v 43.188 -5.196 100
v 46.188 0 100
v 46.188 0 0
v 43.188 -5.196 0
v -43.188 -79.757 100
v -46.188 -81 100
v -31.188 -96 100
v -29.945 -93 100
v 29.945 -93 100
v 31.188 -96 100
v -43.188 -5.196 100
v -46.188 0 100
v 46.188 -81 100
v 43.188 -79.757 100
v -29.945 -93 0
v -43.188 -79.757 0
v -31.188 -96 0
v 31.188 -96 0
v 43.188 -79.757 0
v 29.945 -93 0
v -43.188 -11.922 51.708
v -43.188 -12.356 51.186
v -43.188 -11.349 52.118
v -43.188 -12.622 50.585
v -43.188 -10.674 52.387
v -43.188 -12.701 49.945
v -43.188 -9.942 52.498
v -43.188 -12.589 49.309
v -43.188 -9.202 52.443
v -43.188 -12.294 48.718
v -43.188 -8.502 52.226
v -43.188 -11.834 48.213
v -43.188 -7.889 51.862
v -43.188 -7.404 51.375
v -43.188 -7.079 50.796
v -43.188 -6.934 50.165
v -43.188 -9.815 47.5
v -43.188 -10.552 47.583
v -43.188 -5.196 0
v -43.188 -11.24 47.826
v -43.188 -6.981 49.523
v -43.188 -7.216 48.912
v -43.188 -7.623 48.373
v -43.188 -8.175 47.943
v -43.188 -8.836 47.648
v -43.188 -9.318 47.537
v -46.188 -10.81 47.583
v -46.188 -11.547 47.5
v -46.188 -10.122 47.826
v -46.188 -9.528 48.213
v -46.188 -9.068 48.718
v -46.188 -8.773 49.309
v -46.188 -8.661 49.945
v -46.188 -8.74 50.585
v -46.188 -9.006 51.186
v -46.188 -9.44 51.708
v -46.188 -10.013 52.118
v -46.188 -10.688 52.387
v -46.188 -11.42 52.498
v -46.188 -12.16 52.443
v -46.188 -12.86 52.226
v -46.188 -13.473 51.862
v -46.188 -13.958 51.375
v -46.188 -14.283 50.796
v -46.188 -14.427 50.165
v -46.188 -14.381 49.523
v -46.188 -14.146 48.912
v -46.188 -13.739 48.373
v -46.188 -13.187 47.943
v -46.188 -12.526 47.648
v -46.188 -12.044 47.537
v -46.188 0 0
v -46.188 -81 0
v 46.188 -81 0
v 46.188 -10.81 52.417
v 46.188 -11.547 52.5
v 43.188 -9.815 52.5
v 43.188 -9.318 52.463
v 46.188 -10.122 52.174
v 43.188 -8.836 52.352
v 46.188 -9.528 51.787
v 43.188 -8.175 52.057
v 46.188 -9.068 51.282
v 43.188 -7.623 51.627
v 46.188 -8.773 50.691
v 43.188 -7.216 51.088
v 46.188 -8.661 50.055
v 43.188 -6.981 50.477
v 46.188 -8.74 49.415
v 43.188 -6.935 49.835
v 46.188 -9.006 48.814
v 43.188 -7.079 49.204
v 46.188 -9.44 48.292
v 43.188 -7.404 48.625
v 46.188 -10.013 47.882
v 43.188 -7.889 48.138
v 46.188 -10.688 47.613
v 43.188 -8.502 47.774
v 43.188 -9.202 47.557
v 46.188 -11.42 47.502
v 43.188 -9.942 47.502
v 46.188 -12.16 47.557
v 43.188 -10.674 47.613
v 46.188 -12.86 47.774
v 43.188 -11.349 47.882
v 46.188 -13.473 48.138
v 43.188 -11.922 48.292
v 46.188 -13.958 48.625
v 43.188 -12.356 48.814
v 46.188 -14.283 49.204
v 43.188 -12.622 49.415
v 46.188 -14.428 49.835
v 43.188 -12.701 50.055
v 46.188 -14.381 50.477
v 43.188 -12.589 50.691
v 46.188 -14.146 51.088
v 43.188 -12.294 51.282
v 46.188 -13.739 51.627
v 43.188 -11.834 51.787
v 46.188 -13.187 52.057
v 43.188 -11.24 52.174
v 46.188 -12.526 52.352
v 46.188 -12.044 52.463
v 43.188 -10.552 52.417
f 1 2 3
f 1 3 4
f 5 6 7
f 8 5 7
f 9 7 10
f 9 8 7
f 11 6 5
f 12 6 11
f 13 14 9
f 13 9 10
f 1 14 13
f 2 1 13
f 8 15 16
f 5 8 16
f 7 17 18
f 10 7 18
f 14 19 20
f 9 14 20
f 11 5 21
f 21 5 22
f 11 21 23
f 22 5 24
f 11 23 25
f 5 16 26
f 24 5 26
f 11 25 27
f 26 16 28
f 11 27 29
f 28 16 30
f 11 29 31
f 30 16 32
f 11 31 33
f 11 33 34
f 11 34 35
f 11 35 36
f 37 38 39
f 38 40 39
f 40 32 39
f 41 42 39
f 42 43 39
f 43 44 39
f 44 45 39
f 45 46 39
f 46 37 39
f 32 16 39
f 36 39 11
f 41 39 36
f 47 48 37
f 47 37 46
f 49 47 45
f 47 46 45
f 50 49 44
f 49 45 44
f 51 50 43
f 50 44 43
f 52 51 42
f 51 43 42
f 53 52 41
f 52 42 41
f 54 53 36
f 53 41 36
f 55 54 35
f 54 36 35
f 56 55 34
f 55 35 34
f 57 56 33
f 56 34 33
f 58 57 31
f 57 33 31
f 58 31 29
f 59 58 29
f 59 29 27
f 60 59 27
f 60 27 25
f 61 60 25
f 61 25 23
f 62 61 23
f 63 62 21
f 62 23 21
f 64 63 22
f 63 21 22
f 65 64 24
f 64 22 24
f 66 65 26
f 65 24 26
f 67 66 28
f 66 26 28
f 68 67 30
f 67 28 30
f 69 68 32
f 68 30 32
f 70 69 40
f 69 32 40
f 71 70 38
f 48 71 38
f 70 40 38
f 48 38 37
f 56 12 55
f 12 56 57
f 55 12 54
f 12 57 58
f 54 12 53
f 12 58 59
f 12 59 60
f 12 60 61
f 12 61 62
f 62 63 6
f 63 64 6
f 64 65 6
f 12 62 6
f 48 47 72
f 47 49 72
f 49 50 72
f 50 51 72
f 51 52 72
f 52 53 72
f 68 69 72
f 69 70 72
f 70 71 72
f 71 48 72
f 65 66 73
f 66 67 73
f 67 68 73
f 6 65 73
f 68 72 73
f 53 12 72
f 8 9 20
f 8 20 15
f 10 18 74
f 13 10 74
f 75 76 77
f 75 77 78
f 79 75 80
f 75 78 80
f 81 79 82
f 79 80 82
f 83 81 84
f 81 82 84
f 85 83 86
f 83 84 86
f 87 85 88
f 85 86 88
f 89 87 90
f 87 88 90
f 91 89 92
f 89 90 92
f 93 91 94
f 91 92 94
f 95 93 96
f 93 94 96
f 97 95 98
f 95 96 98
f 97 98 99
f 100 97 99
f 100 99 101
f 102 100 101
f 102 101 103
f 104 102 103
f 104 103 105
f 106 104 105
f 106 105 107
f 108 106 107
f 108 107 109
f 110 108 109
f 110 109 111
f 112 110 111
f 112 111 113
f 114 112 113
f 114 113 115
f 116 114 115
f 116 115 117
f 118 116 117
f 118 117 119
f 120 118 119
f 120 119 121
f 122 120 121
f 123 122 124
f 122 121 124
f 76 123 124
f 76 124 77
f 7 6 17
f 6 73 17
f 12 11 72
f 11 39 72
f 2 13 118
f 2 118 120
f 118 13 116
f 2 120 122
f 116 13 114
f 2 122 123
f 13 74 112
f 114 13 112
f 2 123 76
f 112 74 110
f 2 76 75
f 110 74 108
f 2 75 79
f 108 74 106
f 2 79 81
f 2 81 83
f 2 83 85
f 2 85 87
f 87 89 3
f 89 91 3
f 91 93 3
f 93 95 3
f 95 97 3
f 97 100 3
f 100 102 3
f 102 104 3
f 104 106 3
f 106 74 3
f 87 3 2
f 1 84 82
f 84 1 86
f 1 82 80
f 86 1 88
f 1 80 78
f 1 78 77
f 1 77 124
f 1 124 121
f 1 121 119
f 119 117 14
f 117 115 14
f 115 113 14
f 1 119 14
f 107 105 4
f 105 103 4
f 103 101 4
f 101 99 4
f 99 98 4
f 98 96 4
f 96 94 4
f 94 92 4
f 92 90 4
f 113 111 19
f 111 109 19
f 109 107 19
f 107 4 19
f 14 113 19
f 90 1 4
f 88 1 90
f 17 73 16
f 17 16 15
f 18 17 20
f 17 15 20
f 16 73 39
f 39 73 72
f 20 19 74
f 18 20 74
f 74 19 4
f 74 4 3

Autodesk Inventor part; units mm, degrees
ref_plane "YZ Plane" through (0, 0, 0) normal (1, 0, 0) x (0, 1, 0)
ref_plane "XZ Plane" through (0, 0, 0) normal (0, 1, 0) x (-1, 0, 0)
ref_plane "XY Plane" through (0, 0, 0) normal (0, 0, 1) x (1, 0, 0)
sketch "Sketch1" plane through (0, 0, 0) normal (0, 0, 1) x (1, 0, 0)
  line L0 (-46.188, 0) -> (-23.094, 40)
  line L1 (-23.094, 40) -> (23.094, 40)
  line L2 (23.094, 40) -> (46.188, 0)
  line L3 (46.188, 0) -> (23.094, -40)
  line L4 (23.094, -40) -> (-23.094, -40)
  line L5 (-23.094, -40) -> (-46.188, 0)
  line L6 (-48.188, 0) -> (-46.188, 0)
  line L7 (46.188, 0) -> (48.188, 0)
  line L8 (-46.188, 0) -> (-43.188, -5.1962)
  line L9 (46.188, 0) -> (43.188, -5.1962)
  line L10 (-46.188, 0) -> (-46.188, -81)
  line L11 (-46.188, -81) -> (-31.188, -96)
  line L12 (-31.188, -96) -> (31.188, -96)
  line L13 (31.188, -96) -> (46.188, -81)
  line L14 (46.188, -81) -> (46.188, 0)
  line L15 (43.188, -5.1962) -> (43.188, -79.7574)
  line L16 (43.188, -79.7574) -> (29.9454, -93)
  line L17 (29.9454, -93) -> (-29.9454, -93)
  line L18 (-29.9454, -93) -> (-43.188, -79.7574)
  line L19 (-43.188, -79.7574) -> (-43.188, -5.1962)
  point P0 (0, 0)
  point P1 (0, 0)
  point P2 (0, -96)
  dimension "d0" = 80
  dimension "d6" = 56
  dimension "d7" = 15
  dimension "d8" = 15
  dimension "d9" = 3
extrude "Extrusion1" add sketch "Sketch1" along normal blind 100 contours L5 L19 L18 L17 L16 L15 L3 L14 L13 L12 L11 L10
sketch "Sketch2" plane through (-46.188, 0, 100) normal (0.866, 0.5, 0) x (0, 0, -1)
  circle A0 centre (50, -10) radius 2.5
  line L0 (100, 0) -> (0, 0) projected
  point P0 (100, -23.094)
  point P1 (50, 0)
  dimension "d10" = 5
  dimension "d11" = 10
extrude "Extrusion2" cut sketch "Sketch2" against normal through all
sketch "Sketch3" plane through (43.188, -5.1962, 0) normal (-0.866, 0.5, 0) x (0, 0, 1)
  circle A0 centre (50, -4) radius 2.5
  line L0 (0, 6) -> (100, 6) projected
  point P0 (0, -17.094)
  point P1 (50, 6)
  dimension "d14" = 5
  dimension "d15" = 10
extrude "Extrusion3" cut sketch "Sketch3" against normal through all
properties part number "A03" material "ABS Plastic"
